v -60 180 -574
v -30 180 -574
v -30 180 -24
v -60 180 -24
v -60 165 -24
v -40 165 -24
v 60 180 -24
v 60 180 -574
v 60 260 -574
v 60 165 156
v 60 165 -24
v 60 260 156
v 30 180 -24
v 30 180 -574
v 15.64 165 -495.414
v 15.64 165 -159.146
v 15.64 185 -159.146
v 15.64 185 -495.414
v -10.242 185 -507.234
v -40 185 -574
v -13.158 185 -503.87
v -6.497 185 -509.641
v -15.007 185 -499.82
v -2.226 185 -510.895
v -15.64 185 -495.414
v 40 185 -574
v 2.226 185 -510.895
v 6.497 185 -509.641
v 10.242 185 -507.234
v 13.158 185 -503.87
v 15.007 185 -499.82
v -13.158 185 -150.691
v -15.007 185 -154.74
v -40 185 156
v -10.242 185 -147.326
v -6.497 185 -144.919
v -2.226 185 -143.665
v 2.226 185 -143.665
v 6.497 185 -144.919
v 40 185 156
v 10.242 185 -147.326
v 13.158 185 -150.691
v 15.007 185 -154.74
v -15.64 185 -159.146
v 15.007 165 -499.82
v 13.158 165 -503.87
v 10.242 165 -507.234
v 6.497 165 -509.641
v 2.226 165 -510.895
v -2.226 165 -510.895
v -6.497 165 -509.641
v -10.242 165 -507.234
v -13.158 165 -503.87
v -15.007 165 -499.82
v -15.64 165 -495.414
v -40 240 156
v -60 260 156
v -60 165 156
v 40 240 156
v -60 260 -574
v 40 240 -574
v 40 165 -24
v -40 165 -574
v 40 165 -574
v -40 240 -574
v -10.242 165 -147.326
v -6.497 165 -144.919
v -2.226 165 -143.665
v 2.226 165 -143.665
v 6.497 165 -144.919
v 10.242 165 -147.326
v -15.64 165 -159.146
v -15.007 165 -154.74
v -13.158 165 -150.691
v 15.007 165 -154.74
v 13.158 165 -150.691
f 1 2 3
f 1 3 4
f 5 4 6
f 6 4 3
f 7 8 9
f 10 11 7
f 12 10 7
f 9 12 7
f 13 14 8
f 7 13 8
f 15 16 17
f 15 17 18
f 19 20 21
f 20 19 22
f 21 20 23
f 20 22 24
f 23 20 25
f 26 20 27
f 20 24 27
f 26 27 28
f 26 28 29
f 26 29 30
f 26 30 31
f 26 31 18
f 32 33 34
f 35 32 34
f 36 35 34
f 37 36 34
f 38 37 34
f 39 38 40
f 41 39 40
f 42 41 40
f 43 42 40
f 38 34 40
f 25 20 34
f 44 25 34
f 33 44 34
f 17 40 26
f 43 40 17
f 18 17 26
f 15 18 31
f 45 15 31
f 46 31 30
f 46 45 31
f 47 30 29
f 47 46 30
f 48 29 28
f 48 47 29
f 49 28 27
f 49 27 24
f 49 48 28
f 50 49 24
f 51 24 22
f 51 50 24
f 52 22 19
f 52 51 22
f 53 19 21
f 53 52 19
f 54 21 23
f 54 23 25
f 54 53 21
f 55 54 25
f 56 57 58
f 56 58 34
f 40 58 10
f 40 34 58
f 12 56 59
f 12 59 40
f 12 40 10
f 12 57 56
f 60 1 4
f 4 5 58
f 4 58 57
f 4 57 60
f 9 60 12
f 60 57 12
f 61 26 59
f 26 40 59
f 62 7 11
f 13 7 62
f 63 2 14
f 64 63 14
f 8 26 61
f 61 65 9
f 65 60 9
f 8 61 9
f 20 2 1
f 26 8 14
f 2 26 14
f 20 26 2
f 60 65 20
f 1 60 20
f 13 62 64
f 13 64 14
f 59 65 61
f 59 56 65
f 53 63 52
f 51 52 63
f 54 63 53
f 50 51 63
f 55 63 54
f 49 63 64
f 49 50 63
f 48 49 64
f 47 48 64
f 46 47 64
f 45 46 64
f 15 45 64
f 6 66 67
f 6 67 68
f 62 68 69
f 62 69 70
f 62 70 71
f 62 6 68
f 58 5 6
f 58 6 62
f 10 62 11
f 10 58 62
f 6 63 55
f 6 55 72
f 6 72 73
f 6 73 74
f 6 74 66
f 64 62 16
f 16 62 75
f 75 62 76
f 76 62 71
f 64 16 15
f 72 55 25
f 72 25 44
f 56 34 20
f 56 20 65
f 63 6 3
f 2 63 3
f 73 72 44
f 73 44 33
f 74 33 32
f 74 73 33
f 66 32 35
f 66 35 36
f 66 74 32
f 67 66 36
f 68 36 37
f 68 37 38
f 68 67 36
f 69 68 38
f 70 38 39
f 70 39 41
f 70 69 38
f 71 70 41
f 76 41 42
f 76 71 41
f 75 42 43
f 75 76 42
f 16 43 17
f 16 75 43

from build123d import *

# Parameters (mm, degrees)
SKETCH1_W                = 120
SKETCH1_H                = 95
SKETCH1_W_2              = 80
SKETCH1_H_2              = 55
BOSS_EXTRUDE1_DEPTH      = 156
BOSS_EXTRUDE1_DEPTH_BACK = 574
CUT_EXTRUDE1_DEPTH       = 550
CUT_EXTRUDE2_DEPTH       = 20


with BuildPart() as part:
    # Sketch1 → Boss-Extrude1 (new body, two sides)
    with BuildSketch(Plane.XY) as boss_extrude1_sk:
        with Locations((0, 212.5)):
            Rectangle(SKETCH1_W, SKETCH1_H)
        with Locations((0, 212.5)):
            Rectangle(SKETCH1_W_2, SKETCH1_H_2, mode=Mode.SUBTRACT)
    extrude(amount=BOSS_EXTRUDE1_DEPTH)
    extrude(boss_extrude1_sk.sketch, amount=-BOSS_EXTRUDE1_DEPTH_BACK)

    # Sketch2 → Cut-Extrude1 (cut)
    with BuildSketch(Plane(origin=(0, 0, -574), x_dir=(-1, 0, 0), z_dir=(0, 0, -1))):
        Polygon((-40, 165), (-30, 180), (-60, 180), (-60, 165), align=None)
        Polygon((30, 180), (60, 180), (60, 165), (40, 165), align=None)
    extrude(amount=-CUT_EXTRUDE1_DEPTH, mode=Mode.SUBTRACT)

    # Sketch3 → Cut-Extrude2 (cut)
    with BuildSketch(Plane.XZ.offset(-165)):
        with BuildLine():
            Line((-15.640352243, -495.413950444), (-15.640352243, -159.146377226))
            ThreePointArc((-15.640352243, -159.146377226), (0, -143.506024984), (15.640352243, -159.146377226))
            Line((15.640352243, -159.146377226), (15.640352243, -495.413950444))
            ThreePointArc((15.640352243, -495.413950444), (0, -511.054302687), (-15.640352243, -495.413950444))
        make_face()
    extrude(amount=-CUT_EXTRUDE2_DEPTH, mode=Mode.SUBTRACT)


solid = part.part
